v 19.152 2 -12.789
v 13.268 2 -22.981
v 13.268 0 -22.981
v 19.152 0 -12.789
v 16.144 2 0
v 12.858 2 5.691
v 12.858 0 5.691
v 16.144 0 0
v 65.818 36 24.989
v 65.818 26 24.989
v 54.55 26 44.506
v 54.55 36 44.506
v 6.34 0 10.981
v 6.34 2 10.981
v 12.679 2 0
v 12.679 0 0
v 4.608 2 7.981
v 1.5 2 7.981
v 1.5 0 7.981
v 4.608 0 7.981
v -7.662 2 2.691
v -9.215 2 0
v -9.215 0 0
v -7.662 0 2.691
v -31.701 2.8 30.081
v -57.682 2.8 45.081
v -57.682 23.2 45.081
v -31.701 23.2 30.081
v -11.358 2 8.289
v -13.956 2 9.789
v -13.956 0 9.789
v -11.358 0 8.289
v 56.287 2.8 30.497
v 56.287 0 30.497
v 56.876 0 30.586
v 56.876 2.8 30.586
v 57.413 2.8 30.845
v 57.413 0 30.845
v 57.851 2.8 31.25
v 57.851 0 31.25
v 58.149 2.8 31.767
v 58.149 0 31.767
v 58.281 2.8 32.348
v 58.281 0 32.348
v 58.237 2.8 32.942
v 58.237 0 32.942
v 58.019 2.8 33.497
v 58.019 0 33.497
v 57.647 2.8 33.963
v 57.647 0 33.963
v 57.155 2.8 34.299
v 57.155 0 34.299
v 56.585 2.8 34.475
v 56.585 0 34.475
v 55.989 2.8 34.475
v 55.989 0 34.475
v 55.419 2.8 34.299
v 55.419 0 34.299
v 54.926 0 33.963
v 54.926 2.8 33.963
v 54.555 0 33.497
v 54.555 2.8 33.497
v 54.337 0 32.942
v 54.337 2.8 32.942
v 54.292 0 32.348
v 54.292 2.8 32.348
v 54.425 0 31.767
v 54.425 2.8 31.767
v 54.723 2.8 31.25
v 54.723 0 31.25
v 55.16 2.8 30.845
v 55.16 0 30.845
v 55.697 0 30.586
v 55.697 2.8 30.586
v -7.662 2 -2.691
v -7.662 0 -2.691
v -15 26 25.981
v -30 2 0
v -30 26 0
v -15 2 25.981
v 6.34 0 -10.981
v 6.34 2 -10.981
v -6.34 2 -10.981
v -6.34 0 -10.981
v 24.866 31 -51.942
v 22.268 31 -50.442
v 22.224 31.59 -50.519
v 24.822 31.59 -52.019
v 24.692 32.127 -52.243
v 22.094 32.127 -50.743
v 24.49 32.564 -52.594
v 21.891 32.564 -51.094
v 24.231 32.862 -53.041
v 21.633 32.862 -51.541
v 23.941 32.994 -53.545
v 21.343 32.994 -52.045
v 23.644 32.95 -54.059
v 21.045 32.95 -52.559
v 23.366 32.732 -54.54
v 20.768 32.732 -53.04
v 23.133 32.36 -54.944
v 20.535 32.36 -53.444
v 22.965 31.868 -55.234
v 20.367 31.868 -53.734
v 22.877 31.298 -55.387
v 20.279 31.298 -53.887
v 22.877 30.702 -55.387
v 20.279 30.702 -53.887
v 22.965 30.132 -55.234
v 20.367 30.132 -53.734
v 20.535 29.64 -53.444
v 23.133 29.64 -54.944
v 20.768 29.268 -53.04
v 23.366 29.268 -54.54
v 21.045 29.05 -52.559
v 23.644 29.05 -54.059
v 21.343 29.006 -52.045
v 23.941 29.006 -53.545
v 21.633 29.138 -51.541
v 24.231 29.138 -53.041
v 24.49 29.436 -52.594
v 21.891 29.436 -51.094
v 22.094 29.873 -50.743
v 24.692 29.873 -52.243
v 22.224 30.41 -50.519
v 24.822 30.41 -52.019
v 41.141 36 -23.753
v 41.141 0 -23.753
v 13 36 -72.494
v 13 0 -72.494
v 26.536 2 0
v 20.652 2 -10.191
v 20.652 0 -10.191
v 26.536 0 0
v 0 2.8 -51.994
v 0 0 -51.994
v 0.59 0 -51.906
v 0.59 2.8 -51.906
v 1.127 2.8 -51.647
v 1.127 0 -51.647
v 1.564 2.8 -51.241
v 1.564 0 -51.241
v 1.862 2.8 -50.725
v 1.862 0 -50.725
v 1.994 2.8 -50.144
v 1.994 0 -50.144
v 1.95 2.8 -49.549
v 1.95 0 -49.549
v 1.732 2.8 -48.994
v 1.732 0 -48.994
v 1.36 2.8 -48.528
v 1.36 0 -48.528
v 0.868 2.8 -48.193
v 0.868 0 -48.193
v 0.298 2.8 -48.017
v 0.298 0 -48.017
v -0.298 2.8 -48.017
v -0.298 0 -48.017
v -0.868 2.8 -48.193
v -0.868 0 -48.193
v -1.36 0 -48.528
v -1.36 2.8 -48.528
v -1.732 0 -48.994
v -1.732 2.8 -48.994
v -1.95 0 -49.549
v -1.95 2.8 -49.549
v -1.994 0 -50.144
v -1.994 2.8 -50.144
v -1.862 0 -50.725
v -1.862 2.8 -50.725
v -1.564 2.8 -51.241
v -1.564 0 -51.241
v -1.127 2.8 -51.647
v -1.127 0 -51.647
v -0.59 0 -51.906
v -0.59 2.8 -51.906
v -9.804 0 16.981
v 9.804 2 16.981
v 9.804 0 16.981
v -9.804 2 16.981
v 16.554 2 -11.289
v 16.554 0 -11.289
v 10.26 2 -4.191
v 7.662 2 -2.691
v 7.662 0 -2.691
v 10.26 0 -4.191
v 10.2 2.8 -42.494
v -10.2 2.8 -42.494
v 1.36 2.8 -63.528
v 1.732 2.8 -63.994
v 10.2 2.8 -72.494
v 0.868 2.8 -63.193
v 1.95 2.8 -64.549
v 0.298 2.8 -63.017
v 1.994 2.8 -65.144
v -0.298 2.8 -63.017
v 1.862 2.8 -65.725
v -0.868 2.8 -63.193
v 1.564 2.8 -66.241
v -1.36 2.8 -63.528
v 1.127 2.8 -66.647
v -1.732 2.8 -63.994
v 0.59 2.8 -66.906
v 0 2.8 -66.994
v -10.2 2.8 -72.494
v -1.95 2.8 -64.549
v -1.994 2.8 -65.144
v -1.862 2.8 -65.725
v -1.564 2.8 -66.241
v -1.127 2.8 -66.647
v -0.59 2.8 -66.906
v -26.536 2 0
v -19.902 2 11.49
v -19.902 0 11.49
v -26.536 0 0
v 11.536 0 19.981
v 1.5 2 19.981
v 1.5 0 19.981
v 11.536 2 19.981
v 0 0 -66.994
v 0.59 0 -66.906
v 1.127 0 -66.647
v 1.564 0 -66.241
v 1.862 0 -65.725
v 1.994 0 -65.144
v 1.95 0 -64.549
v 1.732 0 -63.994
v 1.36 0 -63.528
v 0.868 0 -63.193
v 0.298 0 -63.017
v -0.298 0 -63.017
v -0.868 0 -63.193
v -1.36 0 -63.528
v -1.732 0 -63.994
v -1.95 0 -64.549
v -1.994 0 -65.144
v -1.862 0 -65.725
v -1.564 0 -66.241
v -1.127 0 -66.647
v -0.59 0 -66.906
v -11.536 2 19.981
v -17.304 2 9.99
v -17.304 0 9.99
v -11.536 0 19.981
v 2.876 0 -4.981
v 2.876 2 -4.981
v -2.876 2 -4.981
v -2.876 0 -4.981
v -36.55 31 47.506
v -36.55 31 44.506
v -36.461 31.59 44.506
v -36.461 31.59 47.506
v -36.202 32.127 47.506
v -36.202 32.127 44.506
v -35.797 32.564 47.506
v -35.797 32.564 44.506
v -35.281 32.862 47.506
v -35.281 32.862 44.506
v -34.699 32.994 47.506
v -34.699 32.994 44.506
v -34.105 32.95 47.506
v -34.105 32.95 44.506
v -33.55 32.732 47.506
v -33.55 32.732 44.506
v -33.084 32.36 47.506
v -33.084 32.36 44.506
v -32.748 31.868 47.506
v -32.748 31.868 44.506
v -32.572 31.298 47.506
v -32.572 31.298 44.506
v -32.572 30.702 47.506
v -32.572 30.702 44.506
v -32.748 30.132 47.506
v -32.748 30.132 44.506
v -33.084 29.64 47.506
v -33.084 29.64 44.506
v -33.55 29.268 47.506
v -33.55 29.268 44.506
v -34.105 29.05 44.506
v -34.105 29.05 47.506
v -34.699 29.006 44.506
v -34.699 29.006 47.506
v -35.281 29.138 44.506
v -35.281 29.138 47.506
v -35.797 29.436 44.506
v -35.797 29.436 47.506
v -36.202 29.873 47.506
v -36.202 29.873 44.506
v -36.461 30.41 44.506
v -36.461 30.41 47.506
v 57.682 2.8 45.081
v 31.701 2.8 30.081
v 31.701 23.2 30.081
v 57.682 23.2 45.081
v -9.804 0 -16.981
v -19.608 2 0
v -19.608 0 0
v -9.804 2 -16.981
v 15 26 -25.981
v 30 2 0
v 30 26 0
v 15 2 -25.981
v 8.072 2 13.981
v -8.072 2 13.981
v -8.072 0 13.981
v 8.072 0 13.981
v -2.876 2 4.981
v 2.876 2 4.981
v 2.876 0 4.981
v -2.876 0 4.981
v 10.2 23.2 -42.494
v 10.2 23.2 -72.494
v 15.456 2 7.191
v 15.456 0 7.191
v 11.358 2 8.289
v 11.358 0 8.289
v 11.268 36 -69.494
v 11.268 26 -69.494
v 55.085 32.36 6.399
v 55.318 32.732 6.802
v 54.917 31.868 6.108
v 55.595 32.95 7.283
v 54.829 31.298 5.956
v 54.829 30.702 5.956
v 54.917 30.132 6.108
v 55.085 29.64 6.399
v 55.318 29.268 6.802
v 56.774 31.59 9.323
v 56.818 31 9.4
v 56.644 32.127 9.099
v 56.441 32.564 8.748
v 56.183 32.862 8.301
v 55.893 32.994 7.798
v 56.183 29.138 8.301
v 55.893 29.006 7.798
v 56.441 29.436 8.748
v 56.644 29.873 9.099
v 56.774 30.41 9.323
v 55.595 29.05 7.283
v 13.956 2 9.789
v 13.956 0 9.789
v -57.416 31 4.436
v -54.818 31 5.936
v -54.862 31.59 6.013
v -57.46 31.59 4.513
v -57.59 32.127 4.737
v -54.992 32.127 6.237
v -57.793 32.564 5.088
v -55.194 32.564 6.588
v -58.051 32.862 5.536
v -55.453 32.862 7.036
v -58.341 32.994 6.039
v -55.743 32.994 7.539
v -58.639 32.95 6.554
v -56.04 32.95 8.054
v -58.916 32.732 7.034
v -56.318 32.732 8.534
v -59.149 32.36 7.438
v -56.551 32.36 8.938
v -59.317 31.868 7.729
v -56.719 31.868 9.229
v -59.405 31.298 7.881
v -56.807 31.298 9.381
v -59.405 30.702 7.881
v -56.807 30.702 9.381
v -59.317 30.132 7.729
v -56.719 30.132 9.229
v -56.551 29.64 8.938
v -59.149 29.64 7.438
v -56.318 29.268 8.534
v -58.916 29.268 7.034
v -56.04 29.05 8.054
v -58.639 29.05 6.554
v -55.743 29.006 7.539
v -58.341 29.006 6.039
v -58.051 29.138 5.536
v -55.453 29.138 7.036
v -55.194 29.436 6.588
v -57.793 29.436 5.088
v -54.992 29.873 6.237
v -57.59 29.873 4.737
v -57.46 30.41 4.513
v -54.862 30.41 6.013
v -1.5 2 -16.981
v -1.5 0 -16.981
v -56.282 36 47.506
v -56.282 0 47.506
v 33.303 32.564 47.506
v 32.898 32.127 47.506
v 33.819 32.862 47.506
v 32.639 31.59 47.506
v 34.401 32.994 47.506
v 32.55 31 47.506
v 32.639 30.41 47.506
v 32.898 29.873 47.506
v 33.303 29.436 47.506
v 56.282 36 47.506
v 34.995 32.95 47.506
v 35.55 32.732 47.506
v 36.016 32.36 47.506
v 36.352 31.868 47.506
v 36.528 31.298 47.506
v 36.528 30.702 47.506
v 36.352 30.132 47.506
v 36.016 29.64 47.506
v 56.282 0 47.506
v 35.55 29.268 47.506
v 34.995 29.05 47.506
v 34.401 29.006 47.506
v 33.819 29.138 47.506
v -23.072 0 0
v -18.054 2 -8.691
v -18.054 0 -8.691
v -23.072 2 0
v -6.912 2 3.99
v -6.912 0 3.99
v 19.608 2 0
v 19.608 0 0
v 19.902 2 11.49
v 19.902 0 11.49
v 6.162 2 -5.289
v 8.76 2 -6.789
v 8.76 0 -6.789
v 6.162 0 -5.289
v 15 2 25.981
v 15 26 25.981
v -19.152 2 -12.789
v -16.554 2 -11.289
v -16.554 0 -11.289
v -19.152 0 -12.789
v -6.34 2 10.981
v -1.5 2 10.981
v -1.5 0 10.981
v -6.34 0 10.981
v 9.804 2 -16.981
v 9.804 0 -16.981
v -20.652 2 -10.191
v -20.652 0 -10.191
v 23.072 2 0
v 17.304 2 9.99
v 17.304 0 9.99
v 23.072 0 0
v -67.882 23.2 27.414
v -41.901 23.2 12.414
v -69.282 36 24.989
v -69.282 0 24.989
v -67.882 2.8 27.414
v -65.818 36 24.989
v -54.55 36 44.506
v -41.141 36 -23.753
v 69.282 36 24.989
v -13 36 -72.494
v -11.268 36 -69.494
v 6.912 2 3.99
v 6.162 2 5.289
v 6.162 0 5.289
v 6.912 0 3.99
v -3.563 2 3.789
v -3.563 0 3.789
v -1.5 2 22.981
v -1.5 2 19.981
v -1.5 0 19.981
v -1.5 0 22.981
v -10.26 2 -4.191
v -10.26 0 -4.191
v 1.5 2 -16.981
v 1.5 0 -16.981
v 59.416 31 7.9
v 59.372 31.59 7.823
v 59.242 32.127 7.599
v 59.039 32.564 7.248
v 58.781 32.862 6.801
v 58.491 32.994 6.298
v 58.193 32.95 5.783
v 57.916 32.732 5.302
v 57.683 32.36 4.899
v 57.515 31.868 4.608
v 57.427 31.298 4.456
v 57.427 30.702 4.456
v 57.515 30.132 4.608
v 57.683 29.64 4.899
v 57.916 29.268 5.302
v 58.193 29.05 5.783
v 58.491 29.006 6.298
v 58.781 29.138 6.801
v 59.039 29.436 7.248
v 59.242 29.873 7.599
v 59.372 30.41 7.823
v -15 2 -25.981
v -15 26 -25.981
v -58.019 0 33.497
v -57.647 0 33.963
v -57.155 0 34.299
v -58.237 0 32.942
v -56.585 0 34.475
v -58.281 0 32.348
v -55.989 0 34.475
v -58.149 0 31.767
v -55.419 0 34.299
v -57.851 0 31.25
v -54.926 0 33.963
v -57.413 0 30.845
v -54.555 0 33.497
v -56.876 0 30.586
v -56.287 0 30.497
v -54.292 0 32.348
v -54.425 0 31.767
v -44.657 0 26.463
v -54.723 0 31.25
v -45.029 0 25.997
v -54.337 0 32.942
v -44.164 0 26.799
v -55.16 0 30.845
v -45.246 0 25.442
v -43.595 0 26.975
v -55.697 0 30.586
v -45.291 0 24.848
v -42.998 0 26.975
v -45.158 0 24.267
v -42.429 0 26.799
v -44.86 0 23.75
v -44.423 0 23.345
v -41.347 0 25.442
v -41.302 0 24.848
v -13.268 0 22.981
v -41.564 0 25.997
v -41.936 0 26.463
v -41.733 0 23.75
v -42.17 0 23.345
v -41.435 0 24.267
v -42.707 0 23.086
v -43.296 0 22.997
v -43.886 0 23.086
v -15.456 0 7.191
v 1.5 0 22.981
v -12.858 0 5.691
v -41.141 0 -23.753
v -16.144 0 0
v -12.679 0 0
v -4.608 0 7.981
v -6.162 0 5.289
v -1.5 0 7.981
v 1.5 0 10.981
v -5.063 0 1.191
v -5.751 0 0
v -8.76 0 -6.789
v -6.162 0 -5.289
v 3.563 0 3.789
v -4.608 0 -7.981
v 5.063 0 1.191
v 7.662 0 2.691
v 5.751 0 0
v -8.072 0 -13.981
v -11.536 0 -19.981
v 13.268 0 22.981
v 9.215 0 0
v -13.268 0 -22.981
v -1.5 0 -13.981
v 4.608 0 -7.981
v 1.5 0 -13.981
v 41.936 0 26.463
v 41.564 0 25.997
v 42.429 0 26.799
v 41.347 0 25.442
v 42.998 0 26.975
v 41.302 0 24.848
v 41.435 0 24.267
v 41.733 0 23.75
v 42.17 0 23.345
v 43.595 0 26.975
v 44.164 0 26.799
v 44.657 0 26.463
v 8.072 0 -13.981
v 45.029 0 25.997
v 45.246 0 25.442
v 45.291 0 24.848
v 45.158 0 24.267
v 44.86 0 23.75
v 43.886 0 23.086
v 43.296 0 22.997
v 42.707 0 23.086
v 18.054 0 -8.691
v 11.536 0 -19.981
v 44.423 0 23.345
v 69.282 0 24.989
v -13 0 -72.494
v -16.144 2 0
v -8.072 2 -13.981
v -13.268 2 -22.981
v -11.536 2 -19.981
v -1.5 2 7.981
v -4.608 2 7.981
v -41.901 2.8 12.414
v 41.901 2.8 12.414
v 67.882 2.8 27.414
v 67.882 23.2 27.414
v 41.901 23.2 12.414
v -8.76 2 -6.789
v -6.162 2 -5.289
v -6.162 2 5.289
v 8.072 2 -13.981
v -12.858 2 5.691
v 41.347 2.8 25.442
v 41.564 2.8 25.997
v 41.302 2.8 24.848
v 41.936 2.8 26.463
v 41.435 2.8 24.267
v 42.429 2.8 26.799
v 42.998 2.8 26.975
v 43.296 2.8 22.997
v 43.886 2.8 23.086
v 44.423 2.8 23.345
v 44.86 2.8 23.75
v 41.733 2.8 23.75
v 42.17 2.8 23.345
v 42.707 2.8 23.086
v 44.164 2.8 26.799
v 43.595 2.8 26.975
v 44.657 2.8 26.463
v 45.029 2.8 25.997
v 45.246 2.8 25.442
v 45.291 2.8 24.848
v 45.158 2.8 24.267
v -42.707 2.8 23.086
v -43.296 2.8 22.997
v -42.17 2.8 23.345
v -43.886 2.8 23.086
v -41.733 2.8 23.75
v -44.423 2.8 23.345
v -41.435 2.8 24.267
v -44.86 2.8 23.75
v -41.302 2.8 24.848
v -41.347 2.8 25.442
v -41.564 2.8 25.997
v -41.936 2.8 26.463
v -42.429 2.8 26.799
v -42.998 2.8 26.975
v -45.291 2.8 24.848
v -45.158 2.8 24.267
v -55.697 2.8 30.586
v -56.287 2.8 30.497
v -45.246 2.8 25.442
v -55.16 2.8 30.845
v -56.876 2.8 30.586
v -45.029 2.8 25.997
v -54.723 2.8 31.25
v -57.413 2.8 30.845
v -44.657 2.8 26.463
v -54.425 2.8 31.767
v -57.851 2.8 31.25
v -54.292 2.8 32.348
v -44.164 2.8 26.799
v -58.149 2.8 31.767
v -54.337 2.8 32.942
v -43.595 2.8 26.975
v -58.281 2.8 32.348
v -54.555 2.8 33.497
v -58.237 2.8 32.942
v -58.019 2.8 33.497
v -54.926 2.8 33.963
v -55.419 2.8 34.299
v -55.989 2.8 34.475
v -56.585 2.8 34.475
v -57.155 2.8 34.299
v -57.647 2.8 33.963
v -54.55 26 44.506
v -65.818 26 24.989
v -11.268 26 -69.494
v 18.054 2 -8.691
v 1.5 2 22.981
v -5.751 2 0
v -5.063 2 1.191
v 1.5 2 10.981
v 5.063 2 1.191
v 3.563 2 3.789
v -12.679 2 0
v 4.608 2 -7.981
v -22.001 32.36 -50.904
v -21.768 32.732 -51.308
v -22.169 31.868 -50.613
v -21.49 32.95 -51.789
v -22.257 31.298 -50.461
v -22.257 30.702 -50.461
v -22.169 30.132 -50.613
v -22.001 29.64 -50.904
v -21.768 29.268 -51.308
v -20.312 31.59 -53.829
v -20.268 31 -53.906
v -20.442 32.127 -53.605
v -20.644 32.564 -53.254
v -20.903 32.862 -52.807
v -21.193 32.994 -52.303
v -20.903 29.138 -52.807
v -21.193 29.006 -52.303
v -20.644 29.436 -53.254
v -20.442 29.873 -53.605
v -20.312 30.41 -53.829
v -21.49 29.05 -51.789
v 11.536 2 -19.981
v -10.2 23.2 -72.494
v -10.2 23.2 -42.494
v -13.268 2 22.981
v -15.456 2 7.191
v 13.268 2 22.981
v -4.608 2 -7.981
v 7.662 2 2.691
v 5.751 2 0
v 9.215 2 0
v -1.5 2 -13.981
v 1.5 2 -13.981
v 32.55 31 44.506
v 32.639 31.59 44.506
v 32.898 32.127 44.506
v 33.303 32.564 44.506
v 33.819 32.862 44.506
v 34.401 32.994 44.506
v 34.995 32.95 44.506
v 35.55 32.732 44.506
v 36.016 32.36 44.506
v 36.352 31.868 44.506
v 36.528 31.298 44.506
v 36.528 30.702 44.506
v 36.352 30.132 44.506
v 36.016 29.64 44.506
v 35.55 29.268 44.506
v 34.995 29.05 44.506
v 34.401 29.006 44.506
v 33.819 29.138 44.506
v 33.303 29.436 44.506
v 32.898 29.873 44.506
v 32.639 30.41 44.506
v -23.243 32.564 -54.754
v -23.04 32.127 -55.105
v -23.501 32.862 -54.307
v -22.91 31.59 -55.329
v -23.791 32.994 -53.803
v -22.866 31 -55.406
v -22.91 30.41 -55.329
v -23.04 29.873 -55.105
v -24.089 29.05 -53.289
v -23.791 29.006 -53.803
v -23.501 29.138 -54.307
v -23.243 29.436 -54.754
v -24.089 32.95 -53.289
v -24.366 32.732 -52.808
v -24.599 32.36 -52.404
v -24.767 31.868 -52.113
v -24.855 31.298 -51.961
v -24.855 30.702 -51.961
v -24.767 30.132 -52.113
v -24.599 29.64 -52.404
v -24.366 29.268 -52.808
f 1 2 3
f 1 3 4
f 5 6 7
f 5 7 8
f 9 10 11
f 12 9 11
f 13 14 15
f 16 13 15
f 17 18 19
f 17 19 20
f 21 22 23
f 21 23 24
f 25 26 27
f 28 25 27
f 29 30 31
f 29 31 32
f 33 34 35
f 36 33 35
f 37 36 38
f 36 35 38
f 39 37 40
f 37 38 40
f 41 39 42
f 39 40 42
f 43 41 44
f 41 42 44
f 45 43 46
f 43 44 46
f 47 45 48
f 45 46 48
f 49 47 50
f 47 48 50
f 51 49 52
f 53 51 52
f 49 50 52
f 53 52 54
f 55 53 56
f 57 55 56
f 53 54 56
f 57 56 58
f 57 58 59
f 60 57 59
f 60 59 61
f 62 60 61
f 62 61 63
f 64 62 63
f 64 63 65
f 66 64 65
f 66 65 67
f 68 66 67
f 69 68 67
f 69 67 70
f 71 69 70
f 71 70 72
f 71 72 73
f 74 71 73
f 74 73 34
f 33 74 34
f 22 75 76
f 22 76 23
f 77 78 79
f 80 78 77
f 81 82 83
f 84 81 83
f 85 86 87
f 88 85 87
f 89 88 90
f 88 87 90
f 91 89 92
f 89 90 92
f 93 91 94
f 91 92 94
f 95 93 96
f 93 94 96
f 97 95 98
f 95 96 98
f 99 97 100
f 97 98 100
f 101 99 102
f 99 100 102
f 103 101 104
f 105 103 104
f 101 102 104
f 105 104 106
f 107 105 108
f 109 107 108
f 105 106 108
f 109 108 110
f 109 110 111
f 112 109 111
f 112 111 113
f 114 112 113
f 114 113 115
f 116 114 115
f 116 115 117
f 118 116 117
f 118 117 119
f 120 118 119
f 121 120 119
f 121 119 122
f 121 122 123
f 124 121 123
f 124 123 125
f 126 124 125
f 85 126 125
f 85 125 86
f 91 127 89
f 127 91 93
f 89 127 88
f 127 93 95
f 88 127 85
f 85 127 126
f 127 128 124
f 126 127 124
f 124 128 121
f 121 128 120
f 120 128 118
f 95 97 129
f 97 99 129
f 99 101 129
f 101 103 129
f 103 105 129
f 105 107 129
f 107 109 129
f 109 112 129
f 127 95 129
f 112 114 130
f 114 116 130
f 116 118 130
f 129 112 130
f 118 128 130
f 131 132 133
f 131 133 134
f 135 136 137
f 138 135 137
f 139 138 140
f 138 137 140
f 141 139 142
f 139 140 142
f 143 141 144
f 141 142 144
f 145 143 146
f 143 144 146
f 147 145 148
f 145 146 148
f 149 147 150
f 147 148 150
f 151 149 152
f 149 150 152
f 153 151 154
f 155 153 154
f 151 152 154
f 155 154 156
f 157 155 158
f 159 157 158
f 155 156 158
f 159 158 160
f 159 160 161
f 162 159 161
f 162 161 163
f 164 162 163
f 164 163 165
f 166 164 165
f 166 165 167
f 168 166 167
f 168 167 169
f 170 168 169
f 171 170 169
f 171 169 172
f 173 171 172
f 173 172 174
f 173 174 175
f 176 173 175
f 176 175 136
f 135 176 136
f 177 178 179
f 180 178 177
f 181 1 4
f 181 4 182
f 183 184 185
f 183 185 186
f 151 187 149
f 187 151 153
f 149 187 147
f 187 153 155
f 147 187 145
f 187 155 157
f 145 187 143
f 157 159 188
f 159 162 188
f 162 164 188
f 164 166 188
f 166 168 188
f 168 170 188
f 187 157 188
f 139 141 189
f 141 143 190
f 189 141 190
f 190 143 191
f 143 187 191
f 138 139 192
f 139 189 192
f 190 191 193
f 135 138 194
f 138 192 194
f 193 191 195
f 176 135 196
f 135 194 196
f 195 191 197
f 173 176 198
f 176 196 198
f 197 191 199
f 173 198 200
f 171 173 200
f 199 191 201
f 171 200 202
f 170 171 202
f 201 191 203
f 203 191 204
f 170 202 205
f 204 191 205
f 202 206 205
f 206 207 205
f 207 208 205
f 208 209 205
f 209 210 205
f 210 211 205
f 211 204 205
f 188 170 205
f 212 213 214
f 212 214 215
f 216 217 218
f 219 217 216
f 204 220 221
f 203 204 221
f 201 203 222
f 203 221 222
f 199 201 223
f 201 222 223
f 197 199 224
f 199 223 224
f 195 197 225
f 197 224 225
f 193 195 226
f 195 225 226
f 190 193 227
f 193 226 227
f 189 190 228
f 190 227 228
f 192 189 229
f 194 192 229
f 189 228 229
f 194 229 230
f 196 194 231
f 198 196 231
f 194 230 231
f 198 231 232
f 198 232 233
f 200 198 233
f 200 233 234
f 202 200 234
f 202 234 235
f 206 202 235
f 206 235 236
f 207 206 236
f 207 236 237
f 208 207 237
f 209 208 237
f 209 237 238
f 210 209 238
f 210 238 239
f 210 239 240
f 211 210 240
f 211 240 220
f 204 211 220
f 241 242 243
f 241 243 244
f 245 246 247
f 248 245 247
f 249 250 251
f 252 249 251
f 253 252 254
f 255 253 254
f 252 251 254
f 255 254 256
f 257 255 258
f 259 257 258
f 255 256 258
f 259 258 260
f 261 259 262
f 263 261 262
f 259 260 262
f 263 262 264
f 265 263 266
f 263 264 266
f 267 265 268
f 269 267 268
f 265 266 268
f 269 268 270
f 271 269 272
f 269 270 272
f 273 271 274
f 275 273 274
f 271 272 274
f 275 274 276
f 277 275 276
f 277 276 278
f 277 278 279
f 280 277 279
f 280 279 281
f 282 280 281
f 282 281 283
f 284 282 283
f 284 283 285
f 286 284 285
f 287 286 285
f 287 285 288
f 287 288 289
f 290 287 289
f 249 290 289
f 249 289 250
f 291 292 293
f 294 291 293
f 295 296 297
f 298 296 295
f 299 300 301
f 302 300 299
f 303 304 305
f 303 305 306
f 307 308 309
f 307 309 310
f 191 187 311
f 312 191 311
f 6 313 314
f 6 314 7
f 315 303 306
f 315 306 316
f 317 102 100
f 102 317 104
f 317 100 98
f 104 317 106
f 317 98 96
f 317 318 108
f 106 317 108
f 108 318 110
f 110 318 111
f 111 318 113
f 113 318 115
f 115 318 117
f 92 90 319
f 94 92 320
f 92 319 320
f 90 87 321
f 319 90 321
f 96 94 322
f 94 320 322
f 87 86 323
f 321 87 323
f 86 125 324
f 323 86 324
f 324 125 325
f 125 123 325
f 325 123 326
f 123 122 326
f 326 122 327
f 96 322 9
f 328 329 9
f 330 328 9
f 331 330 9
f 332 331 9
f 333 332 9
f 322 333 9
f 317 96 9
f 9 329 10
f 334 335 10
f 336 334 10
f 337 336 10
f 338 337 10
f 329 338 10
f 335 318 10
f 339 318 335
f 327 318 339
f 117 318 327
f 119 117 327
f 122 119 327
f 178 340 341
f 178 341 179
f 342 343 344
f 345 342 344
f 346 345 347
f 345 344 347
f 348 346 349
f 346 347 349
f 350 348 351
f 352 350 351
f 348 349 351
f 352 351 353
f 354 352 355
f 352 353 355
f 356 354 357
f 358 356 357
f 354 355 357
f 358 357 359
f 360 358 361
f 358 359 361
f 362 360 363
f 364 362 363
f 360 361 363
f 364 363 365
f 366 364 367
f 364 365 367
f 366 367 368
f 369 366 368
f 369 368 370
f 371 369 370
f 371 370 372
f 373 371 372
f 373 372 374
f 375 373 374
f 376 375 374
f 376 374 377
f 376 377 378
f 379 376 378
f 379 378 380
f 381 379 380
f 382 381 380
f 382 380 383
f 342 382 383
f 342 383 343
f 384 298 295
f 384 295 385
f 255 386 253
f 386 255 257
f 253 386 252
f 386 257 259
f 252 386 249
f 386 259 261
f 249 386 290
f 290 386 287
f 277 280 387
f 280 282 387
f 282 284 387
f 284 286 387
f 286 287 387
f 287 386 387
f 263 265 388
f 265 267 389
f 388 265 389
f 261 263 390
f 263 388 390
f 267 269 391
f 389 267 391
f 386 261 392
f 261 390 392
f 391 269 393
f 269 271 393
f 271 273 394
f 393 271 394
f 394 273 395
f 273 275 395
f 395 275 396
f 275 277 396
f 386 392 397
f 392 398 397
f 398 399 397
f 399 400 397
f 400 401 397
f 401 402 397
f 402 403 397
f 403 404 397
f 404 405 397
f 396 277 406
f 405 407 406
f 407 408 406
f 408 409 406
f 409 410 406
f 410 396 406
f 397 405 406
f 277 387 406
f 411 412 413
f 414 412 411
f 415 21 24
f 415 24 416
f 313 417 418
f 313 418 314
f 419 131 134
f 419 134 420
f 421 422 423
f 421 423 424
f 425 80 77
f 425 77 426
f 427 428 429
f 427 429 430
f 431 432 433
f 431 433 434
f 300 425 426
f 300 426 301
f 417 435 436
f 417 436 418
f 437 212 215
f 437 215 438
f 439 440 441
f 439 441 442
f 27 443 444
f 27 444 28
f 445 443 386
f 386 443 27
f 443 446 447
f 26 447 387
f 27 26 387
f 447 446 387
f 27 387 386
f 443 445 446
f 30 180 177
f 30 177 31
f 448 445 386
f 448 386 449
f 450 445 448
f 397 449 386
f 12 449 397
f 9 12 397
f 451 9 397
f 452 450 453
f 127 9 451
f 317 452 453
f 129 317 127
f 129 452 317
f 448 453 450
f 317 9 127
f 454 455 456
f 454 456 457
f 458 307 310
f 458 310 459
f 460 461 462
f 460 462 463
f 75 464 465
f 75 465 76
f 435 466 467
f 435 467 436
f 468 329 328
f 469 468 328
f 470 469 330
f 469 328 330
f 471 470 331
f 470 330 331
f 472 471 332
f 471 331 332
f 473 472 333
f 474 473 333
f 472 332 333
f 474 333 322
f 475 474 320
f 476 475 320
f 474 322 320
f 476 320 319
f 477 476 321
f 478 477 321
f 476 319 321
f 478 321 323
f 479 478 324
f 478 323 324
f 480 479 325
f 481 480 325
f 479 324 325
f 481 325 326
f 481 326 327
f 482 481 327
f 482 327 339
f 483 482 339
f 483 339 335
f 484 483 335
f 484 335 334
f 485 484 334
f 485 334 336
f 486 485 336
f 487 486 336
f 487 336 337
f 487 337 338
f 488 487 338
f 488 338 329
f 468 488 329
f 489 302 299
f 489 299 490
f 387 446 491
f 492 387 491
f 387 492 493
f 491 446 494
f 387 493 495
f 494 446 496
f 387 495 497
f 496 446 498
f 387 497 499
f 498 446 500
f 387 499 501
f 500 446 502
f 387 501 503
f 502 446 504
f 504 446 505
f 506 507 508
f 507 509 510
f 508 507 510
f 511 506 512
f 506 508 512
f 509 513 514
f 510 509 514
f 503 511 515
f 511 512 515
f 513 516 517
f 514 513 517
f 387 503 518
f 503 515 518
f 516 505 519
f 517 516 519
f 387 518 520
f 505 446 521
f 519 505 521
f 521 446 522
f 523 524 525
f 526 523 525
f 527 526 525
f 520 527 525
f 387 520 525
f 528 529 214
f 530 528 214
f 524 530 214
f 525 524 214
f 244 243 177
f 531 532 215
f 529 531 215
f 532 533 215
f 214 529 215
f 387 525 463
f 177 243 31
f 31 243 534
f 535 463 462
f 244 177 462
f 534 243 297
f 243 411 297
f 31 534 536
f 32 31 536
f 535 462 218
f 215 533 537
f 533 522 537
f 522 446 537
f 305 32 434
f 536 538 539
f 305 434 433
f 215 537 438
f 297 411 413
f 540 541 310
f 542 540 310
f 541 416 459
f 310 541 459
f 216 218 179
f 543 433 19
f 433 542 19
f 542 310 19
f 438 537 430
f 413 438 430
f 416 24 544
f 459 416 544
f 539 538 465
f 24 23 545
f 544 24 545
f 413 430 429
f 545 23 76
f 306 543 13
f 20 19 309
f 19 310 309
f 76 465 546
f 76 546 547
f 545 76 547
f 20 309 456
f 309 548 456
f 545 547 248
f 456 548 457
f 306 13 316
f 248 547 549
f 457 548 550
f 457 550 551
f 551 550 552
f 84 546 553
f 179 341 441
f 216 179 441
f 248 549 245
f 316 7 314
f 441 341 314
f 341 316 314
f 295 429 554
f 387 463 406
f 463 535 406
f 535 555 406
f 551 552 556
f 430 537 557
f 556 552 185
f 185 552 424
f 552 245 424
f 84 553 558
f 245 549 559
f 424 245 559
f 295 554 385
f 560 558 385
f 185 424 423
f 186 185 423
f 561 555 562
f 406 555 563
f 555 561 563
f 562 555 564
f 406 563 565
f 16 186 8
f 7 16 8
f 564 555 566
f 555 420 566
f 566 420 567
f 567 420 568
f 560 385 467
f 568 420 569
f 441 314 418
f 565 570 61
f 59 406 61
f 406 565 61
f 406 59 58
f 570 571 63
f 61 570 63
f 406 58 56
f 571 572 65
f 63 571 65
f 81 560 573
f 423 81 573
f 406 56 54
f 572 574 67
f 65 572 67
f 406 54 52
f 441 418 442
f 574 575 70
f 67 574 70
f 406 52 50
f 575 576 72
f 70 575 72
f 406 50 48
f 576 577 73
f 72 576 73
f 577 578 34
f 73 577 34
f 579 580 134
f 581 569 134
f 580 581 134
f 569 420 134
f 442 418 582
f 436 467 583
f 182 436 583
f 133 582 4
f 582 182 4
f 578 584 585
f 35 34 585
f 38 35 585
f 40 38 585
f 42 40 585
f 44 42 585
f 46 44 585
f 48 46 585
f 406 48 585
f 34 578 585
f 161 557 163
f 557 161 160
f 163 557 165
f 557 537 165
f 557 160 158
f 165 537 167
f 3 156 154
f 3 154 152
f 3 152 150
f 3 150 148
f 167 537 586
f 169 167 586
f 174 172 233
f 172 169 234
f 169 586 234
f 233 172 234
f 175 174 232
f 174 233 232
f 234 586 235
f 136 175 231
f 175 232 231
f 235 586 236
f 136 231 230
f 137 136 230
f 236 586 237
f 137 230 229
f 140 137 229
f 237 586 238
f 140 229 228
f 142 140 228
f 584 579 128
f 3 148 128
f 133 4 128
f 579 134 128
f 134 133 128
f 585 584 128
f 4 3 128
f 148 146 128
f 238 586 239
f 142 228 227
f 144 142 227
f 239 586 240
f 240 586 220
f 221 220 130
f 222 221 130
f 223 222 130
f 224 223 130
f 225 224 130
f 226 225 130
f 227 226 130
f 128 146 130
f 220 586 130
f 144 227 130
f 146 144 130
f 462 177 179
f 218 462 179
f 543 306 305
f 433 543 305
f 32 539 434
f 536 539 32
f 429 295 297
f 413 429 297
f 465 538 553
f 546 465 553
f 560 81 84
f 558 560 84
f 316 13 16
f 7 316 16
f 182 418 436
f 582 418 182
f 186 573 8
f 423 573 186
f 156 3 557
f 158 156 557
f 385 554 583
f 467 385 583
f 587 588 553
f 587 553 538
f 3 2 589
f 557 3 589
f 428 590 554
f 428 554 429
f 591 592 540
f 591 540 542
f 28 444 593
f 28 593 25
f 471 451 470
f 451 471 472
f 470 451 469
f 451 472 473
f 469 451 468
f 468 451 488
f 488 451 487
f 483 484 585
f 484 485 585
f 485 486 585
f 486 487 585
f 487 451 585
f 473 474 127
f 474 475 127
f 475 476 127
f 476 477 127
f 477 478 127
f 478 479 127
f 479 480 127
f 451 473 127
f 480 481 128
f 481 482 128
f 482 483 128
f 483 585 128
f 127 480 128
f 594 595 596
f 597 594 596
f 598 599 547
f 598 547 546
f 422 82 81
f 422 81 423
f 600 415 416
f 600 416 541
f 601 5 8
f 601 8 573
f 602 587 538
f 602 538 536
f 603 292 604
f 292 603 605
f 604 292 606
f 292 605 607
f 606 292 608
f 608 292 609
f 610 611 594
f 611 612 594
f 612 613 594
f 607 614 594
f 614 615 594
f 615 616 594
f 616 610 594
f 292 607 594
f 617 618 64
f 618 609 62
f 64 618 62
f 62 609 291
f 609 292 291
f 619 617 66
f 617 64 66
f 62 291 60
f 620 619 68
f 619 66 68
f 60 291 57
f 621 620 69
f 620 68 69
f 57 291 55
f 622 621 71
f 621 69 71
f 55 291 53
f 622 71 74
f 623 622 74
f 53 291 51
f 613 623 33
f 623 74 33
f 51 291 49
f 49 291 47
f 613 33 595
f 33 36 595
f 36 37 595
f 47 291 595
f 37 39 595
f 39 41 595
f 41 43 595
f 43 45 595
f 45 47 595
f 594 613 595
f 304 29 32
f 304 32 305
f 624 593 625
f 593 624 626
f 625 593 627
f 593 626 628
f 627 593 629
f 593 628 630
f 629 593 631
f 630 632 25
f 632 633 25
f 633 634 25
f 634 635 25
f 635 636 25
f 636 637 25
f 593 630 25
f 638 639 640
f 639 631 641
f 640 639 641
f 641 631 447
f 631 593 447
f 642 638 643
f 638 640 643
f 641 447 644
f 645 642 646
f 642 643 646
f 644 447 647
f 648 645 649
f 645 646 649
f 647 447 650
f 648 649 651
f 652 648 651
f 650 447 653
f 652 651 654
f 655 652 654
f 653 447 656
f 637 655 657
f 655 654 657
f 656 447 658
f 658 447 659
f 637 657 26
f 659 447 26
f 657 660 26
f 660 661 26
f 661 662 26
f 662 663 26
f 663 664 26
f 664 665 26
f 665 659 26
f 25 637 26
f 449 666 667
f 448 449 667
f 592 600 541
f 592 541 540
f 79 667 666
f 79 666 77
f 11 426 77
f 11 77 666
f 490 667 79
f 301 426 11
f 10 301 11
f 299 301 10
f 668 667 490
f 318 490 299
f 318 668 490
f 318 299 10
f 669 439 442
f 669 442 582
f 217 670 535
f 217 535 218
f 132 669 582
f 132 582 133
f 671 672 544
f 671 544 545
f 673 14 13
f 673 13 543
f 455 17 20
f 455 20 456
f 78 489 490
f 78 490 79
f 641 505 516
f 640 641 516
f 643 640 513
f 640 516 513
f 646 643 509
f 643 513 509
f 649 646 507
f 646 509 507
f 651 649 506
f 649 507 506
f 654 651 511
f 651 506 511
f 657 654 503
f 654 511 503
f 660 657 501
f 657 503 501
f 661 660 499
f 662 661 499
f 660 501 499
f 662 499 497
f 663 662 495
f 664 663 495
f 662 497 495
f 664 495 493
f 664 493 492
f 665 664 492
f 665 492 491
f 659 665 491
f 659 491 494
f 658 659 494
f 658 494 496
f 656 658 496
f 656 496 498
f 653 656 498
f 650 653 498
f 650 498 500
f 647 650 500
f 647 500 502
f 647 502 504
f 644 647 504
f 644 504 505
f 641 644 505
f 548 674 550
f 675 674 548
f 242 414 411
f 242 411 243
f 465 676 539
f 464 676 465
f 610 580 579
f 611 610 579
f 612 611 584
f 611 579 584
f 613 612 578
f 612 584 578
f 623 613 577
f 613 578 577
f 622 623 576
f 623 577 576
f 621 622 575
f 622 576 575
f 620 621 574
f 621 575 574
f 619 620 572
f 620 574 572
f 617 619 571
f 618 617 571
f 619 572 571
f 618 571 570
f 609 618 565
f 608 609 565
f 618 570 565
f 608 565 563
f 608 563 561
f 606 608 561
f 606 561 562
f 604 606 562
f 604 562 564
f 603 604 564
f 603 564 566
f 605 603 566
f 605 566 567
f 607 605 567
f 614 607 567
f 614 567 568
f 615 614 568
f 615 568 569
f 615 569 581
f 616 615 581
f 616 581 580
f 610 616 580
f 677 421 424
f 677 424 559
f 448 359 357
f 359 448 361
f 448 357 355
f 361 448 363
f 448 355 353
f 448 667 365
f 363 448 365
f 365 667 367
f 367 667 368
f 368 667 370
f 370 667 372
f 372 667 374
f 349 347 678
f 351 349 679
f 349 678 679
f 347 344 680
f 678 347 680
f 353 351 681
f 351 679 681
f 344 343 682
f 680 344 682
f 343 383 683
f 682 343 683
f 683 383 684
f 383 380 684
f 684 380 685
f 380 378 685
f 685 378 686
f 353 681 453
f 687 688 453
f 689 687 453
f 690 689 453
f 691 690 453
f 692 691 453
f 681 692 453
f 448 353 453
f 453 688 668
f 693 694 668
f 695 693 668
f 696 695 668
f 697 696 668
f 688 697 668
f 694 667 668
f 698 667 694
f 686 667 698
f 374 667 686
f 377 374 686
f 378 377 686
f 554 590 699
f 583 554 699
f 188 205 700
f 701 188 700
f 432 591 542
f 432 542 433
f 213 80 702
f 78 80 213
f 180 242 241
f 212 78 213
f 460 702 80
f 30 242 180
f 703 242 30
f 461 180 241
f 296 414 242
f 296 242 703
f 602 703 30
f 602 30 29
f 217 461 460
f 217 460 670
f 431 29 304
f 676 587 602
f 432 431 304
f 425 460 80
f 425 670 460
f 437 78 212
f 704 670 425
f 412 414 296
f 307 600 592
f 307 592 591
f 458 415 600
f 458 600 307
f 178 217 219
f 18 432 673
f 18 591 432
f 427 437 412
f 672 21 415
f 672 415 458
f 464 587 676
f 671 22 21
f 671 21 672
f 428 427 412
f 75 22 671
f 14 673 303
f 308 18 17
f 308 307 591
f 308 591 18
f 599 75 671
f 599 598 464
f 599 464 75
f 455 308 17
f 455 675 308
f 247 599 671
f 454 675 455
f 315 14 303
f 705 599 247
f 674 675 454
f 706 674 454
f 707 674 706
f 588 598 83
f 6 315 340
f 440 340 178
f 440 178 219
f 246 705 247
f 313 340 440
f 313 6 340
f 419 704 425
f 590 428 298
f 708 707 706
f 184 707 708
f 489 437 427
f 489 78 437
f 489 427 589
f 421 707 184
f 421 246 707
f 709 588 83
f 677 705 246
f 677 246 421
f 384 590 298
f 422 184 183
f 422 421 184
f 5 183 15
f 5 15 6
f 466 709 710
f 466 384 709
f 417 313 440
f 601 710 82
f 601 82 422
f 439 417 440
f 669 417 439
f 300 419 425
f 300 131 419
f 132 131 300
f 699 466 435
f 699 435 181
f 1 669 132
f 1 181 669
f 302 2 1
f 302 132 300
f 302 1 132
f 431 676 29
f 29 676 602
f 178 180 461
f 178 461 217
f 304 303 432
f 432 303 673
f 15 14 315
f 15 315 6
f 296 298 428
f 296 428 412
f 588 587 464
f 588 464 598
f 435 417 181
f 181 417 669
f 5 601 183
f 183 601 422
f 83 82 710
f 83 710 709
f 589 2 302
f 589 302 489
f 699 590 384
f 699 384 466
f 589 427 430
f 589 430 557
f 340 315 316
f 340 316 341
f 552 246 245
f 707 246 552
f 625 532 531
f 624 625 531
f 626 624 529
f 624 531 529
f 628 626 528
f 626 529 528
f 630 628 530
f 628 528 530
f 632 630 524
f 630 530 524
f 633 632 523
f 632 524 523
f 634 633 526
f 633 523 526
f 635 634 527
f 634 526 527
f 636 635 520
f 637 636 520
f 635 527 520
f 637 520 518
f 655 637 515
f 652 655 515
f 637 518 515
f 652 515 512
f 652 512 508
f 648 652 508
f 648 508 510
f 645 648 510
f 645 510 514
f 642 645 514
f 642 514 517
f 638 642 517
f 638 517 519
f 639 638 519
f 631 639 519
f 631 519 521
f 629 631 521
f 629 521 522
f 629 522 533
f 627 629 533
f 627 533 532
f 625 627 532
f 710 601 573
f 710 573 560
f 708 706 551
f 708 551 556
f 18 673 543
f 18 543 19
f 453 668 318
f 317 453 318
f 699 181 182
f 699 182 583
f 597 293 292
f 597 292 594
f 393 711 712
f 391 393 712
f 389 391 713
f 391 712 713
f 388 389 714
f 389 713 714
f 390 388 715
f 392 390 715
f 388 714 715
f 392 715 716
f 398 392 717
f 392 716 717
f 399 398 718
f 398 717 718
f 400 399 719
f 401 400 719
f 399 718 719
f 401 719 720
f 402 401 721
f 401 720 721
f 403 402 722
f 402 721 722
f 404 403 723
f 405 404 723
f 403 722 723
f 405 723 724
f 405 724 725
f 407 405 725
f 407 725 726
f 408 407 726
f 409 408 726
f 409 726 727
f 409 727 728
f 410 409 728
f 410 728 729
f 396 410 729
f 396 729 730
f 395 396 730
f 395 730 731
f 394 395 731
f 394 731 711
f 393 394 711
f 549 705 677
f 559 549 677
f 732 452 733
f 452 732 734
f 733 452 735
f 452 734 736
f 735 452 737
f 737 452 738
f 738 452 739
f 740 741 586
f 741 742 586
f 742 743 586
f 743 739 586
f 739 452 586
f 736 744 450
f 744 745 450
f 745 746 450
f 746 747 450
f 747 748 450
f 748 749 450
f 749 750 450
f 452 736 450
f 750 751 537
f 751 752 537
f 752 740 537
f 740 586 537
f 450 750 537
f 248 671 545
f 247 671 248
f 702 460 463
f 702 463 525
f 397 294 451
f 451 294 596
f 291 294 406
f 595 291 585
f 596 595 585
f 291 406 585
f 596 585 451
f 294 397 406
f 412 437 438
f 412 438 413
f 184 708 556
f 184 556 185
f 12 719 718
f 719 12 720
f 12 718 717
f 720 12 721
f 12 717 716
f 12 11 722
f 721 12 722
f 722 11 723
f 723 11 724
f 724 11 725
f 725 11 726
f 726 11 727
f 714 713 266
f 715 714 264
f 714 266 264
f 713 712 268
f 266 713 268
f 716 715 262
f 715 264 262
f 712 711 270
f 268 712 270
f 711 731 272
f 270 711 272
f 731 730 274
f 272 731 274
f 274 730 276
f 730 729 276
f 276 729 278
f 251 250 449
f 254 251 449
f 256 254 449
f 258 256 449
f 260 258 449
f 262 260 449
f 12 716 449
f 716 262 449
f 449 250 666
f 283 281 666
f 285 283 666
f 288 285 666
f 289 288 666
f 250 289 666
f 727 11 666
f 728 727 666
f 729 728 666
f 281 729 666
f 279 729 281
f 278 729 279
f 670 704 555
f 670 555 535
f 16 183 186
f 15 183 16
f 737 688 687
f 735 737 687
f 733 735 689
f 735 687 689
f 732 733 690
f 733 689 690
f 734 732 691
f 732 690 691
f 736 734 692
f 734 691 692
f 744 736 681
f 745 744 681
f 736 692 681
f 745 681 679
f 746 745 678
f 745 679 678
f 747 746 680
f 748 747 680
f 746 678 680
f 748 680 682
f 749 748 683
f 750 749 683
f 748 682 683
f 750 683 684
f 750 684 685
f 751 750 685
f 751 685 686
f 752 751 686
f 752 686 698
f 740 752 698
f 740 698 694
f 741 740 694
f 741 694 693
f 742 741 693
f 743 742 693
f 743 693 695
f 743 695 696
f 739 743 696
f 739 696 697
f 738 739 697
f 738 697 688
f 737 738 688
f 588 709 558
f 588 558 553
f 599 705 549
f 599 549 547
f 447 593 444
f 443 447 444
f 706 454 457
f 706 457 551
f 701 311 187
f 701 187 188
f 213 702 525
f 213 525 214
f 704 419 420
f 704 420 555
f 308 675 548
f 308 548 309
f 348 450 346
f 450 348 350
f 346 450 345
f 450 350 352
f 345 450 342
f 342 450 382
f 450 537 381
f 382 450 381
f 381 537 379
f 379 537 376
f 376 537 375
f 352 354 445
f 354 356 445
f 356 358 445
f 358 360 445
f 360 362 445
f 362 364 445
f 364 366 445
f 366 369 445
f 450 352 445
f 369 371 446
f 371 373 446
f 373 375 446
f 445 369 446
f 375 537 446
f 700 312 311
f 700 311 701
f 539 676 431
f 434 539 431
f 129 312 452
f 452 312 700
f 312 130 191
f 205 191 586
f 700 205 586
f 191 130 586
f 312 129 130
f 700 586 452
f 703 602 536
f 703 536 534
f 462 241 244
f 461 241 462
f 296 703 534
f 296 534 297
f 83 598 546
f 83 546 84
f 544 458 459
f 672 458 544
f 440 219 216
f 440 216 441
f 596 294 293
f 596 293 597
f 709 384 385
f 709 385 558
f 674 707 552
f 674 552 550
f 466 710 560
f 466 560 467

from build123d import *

# Parameters (mm, degrees)
BOSS_EXTRUDE1_DEPTH = 2
BOSS_EXTRUDE2_DEPTH = 26
SKETCH2_W           = 20.4
SKETCH2_H           = 20.4
CUT_EXTRUDE1_DEPTH  = 30
CIRPATTERN1_COUNT   = 3
CUT_EXTRUDE2_DEPTH  = 104.592686872
SKETCH4_R           = 2
CUT_EXTRUDE3_DEPTH  = 10
BOSS_EXTRUDE4_START = 26
BOSS_EXTRUDE4_DEPTH = 10
SKETCH5_R           = 2
CUT_EXTRUDE4_DEPTH  = 10
CIRPATTERN2_COUNT   = 3


with BuildPart() as part:
    # Sketch1 → Boss-Extrude1 (new body)
    with BuildSketch(Plane(origin=(0, 0, 0), x_dir=(1, 0, 0), z_dir=(0, 1, 0))):
        Polygon((15, -25.980762114), (30, 0), (15, 25.980762114), (-15, 25.980762114), (-30, 0), (-15, -25.980762114), align=None)
    extrude(amount=BOSS_EXTRUDE1_DEPTH)

    # Sketch1<3> → Boss-Extrude2 (add)
    # profile 1 of 2: a face of its own
    with BuildSketch(Plane(origin=(0, 0, 0), x_dir=(1, 0, 0), z_dir=(0, 1, 0))):
        Polygon((-13, 72.494446501), (-41.141016151, 23.75277675), (-69.282032303, -24.988893001), (-56.282032303, -47.505553499), (0, -47.505553499), (56.282032303, -47.505553499), (69.282032303, -24.988893001), (41.141016151, 23.75277675), (13, 72.494446501), align=None)
        Polygon((-54.549981495, -44.505553499), (-65.817930688, -24.988893001), (-38.54293994, 22.25277675), (-11.267949192, 69.494446501), (11.267949192, 69.494446501), (38.54293994, 22.25277675), (65.817930688, -24.988893001), (54.549981495, -44.505553499), (0, -44.505553499), align=None, mode=Mode.SUBTRACT)
    # profile 2 of 2: a face of its own
    with BuildSketch(Plane(origin=(0, 0, 0), x_dir=(1, 0, 0), z_dir=(0, 1, 0))):
        Polygon((-65.817930688, -24.988893001), (-38.54293994, 22.25277675), (-11.267949192, 69.494446501), (11.267949192, 69.494446501), (38.54293994, 22.25277675), (65.817930688, -24.988893001), (54.549981495, -44.505553499), (0, -44.505553499), (-54.549981495, -44.505553499), align=None)
        Polygon((30, 0), (15, 25.980762114), (-15, 25.980762114), (-30, 0), (-15, -25.980762114), (15, -25.980762114), align=None, mode=Mode.SUBTRACT)
    extrude(amount=BOSS_EXTRUDE2_DEPTH)

    # Sketch2 → Cut-Extrude1 (cut)
    with BuildSketch(Plane(origin=(62.782032303, 0, 36.24722325), x_dir=(0.499999999999999, 0, -0.8660254037844394), z_dir=(0.8660254037844394, 0, 0.499999999999999))):
        with Locations((0, 13)):
            Rectangle(SKETCH2_W, SKETCH2_H)
    cut_extrude1 = extrude(amount=-CUT_EXTRUDE1_DEPTH, mode=Mode.SUBTRACT)

    # CirPattern1: Cut-Extrude1 ×3 about axis
    cirpattern1_axis = Axis((0, 0, 0), (0, 1, 0))
    for i in range(1, CIRPATTERN1_COUNT):
        add(cut_extrude1.rotate(cirpattern1_axis, i * 360 / CIRPATTERN1_COUNT), mode=Mode.SUBTRACT)

    # Sketch3 → Cut-Extrude2 (cut, through all)
    with BuildSketch(Plane(origin=(0, 26, 0), x_dir=(1, 0, 0), z_dir=(0, 1, 0))):
        Polygon((-5.063466521, -1.191342951), (-5.751288694, 0), (-2.875644347, 4.980762114), (-1.5, 4.980762114), (1.5, 4.980762114), (2.875644347, 4.980762114), (5.751288694, 0), (5.063466521, -1.191342951), (3.563466521, -3.789419162), (2.875644347, -4.980762114), (-2.875644347, -4.980762114), (-3.563466521, -3.789419162), align=None)
        Polygon((6.161542732, -5.289419162), (6.911542732, -3.990381057), (7.661542732, -2.691342951), (9.215390309, 0), (7.661542732, 2.691342951), (10.259618943, 4.191342951), (12.679491924, 0), (9.509618943, -5.490381057), (6.339745962, -10.980762114), (1.5, -10.980762114), (1.5, -7.980762114), (4.607695155, -7.980762114), align=None)
        Polygon((-6.339745962, 10.980762114), (0, 10.980762114), (6.339745962, 10.980762114), (8.759618943, 6.789419162), (6.161542732, 5.289419162), (4.607695155, 7.980762114), (1.5, 7.980762114), (0, 7.980762114), (-1.5, 7.980762114), (-4.607695155, 7.980762114), (-6.161542732, 5.289419162), (-8.759618943, 6.789419162), align=None)
        Polygon((-7.661542732, -2.691342951), (-6.911542732, -3.990381057), (-6.161542732, -5.289419162), (-4.607695155, -7.980762114), (-1.5, -7.980762114), (-1.5, -10.980762114), (-6.339745962, -10.980762114), (-9.509618943, -5.490381057), (-12.679491924, 0), (-10.259618943, 4.191342951), (-7.661542732, 2.691342951), (-9.215390309, 0), align=None)
        Polygon((-9.803847577, -16.980762114), (-13.955771366, -9.789419162), (-11.357695155, -8.289419162), (-8.07179677, -13.980762114), (8.07179677, -13.980762114), (11.357695155, -8.289419162), (13.955771366, -9.789419162), (9.803847577, -16.980762114), align=None)
        Polygon((19.607695155, 0), (15.455771366, -7.191342951), (12.857695155, -5.691342951), (16.143593539, 0), (8.07179677, 13.980762114), (1.5, 13.980762114), (1.5, 16.980762114), (9.803847577, 16.980762114), align=None)
        Polygon((-9.803847577, 16.980762114), (-1.5, 16.980762114), (-1.5, 13.980762114), (-8.07179677, 13.980762114), (-16.143593539, 0), (-12.857695155, -5.691342951), (-15.455771366, -7.191342951), (-19.607695155, 0), align=None)
        Polygon((0, 22.980762114), (13.267949192, 22.980762114), (19.151923789, 12.789419162), (16.553847577, 11.289419162), (11.535898385, 19.980762114), (0, 19.980762114), (-11.535898385, 19.980762114), (-16.553847577, 11.289419162), (-19.151923789, 12.789419162), (-13.267949192, 22.980762114), align=None)
        Polygon((-23.07179677, 0), (-17.303847577, -9.990381057), (-11.535898385, -19.980762114), (-1.5, -19.980762114), (-1.5, -22.980762114), (-13.267949192, -22.980762114), (-19.901923789, -11.490381057), (-26.535898385, 0), (-20.651923789, 10.191342951), (-18.053847577, 8.691342951), align=None)
        Polygon((11.535898385, -19.980762114), (17.303847577, -9.990381057), (23.07179677, 0), (18.053847577, 8.691342951), (20.651923789, 10.191342951), (26.535898385, 0), (19.901923789, -11.490381057), (13.267949192, -22.980762114), (1.5, -22.980762114), (1.5, -19.980762114), align=None)
    extrude(amount=-CUT_EXTRUDE2_DEPTH, mode=Mode.SUBTRACT)

    # Sketch4 → Cut-Extrude3 (cut)
    with BuildSketch(Plane.XZ):
        with Locations(Location((0, -64.994446501, 0), (0, 0, 270))):
            Circle(SKETCH4_R)
        with Locations(Location((0, -49.994446501, 0), (0, 0, 270))):
            Circle(SKETCH4_R)
        with Locations(Location((-56.286841774, 32.49722325, 0), (0, 0, 270))):
            Circle(SKETCH4_R)
        with Locations(Location((-43.296460718, 24.99722325, 0), (0, 0, 270))):
            Circle(SKETCH4_R)
        with Locations(Location((56.286841774, 32.49722325, 0), (0, 0, 270))):
            Circle(SKETCH4_R)
        with Locations(Location((43.296460718, 24.99722325, 0), (0, 0, 270))):
            Circle(SKETCH4_R)
    extrude(amount=-CUT_EXTRUDE3_DEPTH, mode=Mode.SUBTRACT)

    # Sketch1<5> → Boss-Extrude4 (add)
    with BuildSketch(Plane(origin=(0, 0, 0), x_dir=(1, 0, 0), z_dir=(0, 1, 0)).offset(BOSS_EXTRUDE4_START)):
        Polygon((-13, 72.494446501), (-41.141016151, 23.75277675), (-69.282032303, -24.988893001), (-56.282032303, -47.505553499), (0, -47.505553499), (56.282032303, -47.505553499), (69.282032303, -24.988893001), (41.141016151, 23.75277675), (13, 72.494446501), align=None)
        Polygon((-54.549981495, -44.505553499), (-65.817930688, -24.988893001), (-38.54293994, 22.25277675), (-11.267949192, 69.494446501), (11.267949192, 69.494446501), (38.54293994, 22.25277675), (65.817930688, -24.988893001), (54.549981495, -44.505553499), (0, -44.505553499), align=None, mode=Mode.SUBTRACT)
    extrude(amount=BOSS_EXTRUDE4_DEPTH)

    # Sketch5 → Cut-Extrude4 (cut)
    with BuildSketch(Plane(origin=(-38.54293994, 0, -22.25277675), x_dir=(0.4999999999999866, 0, -0.8660254037844465), z_dir=(0.8660254037844464, 0, 0.49999999999998657))):
        with Locations((-34.549981495, 31)):
            Circle(SKETCH5_R)
        with Locations((34.549981495, 31)):
            Circle(SKETCH5_R)
    cut_extrude4 = extrude(amount=-CUT_EXTRUDE4_DEPTH, mode=Mode.SUBTRACT)

    # CirPattern2: Cut-Extrude4 ×3 about axis
    cirpattern2_axis = Axis((0, 27.3, 0), (0, -1, 0))
    for i in range(1, CIRPATTERN2_COUNT):
        add(cut_extrude4.rotate(cirpattern2_axis, i * 360 / CIRPATTERN2_COUNT), mode=Mode.SUBTRACT)


solid = part.part
